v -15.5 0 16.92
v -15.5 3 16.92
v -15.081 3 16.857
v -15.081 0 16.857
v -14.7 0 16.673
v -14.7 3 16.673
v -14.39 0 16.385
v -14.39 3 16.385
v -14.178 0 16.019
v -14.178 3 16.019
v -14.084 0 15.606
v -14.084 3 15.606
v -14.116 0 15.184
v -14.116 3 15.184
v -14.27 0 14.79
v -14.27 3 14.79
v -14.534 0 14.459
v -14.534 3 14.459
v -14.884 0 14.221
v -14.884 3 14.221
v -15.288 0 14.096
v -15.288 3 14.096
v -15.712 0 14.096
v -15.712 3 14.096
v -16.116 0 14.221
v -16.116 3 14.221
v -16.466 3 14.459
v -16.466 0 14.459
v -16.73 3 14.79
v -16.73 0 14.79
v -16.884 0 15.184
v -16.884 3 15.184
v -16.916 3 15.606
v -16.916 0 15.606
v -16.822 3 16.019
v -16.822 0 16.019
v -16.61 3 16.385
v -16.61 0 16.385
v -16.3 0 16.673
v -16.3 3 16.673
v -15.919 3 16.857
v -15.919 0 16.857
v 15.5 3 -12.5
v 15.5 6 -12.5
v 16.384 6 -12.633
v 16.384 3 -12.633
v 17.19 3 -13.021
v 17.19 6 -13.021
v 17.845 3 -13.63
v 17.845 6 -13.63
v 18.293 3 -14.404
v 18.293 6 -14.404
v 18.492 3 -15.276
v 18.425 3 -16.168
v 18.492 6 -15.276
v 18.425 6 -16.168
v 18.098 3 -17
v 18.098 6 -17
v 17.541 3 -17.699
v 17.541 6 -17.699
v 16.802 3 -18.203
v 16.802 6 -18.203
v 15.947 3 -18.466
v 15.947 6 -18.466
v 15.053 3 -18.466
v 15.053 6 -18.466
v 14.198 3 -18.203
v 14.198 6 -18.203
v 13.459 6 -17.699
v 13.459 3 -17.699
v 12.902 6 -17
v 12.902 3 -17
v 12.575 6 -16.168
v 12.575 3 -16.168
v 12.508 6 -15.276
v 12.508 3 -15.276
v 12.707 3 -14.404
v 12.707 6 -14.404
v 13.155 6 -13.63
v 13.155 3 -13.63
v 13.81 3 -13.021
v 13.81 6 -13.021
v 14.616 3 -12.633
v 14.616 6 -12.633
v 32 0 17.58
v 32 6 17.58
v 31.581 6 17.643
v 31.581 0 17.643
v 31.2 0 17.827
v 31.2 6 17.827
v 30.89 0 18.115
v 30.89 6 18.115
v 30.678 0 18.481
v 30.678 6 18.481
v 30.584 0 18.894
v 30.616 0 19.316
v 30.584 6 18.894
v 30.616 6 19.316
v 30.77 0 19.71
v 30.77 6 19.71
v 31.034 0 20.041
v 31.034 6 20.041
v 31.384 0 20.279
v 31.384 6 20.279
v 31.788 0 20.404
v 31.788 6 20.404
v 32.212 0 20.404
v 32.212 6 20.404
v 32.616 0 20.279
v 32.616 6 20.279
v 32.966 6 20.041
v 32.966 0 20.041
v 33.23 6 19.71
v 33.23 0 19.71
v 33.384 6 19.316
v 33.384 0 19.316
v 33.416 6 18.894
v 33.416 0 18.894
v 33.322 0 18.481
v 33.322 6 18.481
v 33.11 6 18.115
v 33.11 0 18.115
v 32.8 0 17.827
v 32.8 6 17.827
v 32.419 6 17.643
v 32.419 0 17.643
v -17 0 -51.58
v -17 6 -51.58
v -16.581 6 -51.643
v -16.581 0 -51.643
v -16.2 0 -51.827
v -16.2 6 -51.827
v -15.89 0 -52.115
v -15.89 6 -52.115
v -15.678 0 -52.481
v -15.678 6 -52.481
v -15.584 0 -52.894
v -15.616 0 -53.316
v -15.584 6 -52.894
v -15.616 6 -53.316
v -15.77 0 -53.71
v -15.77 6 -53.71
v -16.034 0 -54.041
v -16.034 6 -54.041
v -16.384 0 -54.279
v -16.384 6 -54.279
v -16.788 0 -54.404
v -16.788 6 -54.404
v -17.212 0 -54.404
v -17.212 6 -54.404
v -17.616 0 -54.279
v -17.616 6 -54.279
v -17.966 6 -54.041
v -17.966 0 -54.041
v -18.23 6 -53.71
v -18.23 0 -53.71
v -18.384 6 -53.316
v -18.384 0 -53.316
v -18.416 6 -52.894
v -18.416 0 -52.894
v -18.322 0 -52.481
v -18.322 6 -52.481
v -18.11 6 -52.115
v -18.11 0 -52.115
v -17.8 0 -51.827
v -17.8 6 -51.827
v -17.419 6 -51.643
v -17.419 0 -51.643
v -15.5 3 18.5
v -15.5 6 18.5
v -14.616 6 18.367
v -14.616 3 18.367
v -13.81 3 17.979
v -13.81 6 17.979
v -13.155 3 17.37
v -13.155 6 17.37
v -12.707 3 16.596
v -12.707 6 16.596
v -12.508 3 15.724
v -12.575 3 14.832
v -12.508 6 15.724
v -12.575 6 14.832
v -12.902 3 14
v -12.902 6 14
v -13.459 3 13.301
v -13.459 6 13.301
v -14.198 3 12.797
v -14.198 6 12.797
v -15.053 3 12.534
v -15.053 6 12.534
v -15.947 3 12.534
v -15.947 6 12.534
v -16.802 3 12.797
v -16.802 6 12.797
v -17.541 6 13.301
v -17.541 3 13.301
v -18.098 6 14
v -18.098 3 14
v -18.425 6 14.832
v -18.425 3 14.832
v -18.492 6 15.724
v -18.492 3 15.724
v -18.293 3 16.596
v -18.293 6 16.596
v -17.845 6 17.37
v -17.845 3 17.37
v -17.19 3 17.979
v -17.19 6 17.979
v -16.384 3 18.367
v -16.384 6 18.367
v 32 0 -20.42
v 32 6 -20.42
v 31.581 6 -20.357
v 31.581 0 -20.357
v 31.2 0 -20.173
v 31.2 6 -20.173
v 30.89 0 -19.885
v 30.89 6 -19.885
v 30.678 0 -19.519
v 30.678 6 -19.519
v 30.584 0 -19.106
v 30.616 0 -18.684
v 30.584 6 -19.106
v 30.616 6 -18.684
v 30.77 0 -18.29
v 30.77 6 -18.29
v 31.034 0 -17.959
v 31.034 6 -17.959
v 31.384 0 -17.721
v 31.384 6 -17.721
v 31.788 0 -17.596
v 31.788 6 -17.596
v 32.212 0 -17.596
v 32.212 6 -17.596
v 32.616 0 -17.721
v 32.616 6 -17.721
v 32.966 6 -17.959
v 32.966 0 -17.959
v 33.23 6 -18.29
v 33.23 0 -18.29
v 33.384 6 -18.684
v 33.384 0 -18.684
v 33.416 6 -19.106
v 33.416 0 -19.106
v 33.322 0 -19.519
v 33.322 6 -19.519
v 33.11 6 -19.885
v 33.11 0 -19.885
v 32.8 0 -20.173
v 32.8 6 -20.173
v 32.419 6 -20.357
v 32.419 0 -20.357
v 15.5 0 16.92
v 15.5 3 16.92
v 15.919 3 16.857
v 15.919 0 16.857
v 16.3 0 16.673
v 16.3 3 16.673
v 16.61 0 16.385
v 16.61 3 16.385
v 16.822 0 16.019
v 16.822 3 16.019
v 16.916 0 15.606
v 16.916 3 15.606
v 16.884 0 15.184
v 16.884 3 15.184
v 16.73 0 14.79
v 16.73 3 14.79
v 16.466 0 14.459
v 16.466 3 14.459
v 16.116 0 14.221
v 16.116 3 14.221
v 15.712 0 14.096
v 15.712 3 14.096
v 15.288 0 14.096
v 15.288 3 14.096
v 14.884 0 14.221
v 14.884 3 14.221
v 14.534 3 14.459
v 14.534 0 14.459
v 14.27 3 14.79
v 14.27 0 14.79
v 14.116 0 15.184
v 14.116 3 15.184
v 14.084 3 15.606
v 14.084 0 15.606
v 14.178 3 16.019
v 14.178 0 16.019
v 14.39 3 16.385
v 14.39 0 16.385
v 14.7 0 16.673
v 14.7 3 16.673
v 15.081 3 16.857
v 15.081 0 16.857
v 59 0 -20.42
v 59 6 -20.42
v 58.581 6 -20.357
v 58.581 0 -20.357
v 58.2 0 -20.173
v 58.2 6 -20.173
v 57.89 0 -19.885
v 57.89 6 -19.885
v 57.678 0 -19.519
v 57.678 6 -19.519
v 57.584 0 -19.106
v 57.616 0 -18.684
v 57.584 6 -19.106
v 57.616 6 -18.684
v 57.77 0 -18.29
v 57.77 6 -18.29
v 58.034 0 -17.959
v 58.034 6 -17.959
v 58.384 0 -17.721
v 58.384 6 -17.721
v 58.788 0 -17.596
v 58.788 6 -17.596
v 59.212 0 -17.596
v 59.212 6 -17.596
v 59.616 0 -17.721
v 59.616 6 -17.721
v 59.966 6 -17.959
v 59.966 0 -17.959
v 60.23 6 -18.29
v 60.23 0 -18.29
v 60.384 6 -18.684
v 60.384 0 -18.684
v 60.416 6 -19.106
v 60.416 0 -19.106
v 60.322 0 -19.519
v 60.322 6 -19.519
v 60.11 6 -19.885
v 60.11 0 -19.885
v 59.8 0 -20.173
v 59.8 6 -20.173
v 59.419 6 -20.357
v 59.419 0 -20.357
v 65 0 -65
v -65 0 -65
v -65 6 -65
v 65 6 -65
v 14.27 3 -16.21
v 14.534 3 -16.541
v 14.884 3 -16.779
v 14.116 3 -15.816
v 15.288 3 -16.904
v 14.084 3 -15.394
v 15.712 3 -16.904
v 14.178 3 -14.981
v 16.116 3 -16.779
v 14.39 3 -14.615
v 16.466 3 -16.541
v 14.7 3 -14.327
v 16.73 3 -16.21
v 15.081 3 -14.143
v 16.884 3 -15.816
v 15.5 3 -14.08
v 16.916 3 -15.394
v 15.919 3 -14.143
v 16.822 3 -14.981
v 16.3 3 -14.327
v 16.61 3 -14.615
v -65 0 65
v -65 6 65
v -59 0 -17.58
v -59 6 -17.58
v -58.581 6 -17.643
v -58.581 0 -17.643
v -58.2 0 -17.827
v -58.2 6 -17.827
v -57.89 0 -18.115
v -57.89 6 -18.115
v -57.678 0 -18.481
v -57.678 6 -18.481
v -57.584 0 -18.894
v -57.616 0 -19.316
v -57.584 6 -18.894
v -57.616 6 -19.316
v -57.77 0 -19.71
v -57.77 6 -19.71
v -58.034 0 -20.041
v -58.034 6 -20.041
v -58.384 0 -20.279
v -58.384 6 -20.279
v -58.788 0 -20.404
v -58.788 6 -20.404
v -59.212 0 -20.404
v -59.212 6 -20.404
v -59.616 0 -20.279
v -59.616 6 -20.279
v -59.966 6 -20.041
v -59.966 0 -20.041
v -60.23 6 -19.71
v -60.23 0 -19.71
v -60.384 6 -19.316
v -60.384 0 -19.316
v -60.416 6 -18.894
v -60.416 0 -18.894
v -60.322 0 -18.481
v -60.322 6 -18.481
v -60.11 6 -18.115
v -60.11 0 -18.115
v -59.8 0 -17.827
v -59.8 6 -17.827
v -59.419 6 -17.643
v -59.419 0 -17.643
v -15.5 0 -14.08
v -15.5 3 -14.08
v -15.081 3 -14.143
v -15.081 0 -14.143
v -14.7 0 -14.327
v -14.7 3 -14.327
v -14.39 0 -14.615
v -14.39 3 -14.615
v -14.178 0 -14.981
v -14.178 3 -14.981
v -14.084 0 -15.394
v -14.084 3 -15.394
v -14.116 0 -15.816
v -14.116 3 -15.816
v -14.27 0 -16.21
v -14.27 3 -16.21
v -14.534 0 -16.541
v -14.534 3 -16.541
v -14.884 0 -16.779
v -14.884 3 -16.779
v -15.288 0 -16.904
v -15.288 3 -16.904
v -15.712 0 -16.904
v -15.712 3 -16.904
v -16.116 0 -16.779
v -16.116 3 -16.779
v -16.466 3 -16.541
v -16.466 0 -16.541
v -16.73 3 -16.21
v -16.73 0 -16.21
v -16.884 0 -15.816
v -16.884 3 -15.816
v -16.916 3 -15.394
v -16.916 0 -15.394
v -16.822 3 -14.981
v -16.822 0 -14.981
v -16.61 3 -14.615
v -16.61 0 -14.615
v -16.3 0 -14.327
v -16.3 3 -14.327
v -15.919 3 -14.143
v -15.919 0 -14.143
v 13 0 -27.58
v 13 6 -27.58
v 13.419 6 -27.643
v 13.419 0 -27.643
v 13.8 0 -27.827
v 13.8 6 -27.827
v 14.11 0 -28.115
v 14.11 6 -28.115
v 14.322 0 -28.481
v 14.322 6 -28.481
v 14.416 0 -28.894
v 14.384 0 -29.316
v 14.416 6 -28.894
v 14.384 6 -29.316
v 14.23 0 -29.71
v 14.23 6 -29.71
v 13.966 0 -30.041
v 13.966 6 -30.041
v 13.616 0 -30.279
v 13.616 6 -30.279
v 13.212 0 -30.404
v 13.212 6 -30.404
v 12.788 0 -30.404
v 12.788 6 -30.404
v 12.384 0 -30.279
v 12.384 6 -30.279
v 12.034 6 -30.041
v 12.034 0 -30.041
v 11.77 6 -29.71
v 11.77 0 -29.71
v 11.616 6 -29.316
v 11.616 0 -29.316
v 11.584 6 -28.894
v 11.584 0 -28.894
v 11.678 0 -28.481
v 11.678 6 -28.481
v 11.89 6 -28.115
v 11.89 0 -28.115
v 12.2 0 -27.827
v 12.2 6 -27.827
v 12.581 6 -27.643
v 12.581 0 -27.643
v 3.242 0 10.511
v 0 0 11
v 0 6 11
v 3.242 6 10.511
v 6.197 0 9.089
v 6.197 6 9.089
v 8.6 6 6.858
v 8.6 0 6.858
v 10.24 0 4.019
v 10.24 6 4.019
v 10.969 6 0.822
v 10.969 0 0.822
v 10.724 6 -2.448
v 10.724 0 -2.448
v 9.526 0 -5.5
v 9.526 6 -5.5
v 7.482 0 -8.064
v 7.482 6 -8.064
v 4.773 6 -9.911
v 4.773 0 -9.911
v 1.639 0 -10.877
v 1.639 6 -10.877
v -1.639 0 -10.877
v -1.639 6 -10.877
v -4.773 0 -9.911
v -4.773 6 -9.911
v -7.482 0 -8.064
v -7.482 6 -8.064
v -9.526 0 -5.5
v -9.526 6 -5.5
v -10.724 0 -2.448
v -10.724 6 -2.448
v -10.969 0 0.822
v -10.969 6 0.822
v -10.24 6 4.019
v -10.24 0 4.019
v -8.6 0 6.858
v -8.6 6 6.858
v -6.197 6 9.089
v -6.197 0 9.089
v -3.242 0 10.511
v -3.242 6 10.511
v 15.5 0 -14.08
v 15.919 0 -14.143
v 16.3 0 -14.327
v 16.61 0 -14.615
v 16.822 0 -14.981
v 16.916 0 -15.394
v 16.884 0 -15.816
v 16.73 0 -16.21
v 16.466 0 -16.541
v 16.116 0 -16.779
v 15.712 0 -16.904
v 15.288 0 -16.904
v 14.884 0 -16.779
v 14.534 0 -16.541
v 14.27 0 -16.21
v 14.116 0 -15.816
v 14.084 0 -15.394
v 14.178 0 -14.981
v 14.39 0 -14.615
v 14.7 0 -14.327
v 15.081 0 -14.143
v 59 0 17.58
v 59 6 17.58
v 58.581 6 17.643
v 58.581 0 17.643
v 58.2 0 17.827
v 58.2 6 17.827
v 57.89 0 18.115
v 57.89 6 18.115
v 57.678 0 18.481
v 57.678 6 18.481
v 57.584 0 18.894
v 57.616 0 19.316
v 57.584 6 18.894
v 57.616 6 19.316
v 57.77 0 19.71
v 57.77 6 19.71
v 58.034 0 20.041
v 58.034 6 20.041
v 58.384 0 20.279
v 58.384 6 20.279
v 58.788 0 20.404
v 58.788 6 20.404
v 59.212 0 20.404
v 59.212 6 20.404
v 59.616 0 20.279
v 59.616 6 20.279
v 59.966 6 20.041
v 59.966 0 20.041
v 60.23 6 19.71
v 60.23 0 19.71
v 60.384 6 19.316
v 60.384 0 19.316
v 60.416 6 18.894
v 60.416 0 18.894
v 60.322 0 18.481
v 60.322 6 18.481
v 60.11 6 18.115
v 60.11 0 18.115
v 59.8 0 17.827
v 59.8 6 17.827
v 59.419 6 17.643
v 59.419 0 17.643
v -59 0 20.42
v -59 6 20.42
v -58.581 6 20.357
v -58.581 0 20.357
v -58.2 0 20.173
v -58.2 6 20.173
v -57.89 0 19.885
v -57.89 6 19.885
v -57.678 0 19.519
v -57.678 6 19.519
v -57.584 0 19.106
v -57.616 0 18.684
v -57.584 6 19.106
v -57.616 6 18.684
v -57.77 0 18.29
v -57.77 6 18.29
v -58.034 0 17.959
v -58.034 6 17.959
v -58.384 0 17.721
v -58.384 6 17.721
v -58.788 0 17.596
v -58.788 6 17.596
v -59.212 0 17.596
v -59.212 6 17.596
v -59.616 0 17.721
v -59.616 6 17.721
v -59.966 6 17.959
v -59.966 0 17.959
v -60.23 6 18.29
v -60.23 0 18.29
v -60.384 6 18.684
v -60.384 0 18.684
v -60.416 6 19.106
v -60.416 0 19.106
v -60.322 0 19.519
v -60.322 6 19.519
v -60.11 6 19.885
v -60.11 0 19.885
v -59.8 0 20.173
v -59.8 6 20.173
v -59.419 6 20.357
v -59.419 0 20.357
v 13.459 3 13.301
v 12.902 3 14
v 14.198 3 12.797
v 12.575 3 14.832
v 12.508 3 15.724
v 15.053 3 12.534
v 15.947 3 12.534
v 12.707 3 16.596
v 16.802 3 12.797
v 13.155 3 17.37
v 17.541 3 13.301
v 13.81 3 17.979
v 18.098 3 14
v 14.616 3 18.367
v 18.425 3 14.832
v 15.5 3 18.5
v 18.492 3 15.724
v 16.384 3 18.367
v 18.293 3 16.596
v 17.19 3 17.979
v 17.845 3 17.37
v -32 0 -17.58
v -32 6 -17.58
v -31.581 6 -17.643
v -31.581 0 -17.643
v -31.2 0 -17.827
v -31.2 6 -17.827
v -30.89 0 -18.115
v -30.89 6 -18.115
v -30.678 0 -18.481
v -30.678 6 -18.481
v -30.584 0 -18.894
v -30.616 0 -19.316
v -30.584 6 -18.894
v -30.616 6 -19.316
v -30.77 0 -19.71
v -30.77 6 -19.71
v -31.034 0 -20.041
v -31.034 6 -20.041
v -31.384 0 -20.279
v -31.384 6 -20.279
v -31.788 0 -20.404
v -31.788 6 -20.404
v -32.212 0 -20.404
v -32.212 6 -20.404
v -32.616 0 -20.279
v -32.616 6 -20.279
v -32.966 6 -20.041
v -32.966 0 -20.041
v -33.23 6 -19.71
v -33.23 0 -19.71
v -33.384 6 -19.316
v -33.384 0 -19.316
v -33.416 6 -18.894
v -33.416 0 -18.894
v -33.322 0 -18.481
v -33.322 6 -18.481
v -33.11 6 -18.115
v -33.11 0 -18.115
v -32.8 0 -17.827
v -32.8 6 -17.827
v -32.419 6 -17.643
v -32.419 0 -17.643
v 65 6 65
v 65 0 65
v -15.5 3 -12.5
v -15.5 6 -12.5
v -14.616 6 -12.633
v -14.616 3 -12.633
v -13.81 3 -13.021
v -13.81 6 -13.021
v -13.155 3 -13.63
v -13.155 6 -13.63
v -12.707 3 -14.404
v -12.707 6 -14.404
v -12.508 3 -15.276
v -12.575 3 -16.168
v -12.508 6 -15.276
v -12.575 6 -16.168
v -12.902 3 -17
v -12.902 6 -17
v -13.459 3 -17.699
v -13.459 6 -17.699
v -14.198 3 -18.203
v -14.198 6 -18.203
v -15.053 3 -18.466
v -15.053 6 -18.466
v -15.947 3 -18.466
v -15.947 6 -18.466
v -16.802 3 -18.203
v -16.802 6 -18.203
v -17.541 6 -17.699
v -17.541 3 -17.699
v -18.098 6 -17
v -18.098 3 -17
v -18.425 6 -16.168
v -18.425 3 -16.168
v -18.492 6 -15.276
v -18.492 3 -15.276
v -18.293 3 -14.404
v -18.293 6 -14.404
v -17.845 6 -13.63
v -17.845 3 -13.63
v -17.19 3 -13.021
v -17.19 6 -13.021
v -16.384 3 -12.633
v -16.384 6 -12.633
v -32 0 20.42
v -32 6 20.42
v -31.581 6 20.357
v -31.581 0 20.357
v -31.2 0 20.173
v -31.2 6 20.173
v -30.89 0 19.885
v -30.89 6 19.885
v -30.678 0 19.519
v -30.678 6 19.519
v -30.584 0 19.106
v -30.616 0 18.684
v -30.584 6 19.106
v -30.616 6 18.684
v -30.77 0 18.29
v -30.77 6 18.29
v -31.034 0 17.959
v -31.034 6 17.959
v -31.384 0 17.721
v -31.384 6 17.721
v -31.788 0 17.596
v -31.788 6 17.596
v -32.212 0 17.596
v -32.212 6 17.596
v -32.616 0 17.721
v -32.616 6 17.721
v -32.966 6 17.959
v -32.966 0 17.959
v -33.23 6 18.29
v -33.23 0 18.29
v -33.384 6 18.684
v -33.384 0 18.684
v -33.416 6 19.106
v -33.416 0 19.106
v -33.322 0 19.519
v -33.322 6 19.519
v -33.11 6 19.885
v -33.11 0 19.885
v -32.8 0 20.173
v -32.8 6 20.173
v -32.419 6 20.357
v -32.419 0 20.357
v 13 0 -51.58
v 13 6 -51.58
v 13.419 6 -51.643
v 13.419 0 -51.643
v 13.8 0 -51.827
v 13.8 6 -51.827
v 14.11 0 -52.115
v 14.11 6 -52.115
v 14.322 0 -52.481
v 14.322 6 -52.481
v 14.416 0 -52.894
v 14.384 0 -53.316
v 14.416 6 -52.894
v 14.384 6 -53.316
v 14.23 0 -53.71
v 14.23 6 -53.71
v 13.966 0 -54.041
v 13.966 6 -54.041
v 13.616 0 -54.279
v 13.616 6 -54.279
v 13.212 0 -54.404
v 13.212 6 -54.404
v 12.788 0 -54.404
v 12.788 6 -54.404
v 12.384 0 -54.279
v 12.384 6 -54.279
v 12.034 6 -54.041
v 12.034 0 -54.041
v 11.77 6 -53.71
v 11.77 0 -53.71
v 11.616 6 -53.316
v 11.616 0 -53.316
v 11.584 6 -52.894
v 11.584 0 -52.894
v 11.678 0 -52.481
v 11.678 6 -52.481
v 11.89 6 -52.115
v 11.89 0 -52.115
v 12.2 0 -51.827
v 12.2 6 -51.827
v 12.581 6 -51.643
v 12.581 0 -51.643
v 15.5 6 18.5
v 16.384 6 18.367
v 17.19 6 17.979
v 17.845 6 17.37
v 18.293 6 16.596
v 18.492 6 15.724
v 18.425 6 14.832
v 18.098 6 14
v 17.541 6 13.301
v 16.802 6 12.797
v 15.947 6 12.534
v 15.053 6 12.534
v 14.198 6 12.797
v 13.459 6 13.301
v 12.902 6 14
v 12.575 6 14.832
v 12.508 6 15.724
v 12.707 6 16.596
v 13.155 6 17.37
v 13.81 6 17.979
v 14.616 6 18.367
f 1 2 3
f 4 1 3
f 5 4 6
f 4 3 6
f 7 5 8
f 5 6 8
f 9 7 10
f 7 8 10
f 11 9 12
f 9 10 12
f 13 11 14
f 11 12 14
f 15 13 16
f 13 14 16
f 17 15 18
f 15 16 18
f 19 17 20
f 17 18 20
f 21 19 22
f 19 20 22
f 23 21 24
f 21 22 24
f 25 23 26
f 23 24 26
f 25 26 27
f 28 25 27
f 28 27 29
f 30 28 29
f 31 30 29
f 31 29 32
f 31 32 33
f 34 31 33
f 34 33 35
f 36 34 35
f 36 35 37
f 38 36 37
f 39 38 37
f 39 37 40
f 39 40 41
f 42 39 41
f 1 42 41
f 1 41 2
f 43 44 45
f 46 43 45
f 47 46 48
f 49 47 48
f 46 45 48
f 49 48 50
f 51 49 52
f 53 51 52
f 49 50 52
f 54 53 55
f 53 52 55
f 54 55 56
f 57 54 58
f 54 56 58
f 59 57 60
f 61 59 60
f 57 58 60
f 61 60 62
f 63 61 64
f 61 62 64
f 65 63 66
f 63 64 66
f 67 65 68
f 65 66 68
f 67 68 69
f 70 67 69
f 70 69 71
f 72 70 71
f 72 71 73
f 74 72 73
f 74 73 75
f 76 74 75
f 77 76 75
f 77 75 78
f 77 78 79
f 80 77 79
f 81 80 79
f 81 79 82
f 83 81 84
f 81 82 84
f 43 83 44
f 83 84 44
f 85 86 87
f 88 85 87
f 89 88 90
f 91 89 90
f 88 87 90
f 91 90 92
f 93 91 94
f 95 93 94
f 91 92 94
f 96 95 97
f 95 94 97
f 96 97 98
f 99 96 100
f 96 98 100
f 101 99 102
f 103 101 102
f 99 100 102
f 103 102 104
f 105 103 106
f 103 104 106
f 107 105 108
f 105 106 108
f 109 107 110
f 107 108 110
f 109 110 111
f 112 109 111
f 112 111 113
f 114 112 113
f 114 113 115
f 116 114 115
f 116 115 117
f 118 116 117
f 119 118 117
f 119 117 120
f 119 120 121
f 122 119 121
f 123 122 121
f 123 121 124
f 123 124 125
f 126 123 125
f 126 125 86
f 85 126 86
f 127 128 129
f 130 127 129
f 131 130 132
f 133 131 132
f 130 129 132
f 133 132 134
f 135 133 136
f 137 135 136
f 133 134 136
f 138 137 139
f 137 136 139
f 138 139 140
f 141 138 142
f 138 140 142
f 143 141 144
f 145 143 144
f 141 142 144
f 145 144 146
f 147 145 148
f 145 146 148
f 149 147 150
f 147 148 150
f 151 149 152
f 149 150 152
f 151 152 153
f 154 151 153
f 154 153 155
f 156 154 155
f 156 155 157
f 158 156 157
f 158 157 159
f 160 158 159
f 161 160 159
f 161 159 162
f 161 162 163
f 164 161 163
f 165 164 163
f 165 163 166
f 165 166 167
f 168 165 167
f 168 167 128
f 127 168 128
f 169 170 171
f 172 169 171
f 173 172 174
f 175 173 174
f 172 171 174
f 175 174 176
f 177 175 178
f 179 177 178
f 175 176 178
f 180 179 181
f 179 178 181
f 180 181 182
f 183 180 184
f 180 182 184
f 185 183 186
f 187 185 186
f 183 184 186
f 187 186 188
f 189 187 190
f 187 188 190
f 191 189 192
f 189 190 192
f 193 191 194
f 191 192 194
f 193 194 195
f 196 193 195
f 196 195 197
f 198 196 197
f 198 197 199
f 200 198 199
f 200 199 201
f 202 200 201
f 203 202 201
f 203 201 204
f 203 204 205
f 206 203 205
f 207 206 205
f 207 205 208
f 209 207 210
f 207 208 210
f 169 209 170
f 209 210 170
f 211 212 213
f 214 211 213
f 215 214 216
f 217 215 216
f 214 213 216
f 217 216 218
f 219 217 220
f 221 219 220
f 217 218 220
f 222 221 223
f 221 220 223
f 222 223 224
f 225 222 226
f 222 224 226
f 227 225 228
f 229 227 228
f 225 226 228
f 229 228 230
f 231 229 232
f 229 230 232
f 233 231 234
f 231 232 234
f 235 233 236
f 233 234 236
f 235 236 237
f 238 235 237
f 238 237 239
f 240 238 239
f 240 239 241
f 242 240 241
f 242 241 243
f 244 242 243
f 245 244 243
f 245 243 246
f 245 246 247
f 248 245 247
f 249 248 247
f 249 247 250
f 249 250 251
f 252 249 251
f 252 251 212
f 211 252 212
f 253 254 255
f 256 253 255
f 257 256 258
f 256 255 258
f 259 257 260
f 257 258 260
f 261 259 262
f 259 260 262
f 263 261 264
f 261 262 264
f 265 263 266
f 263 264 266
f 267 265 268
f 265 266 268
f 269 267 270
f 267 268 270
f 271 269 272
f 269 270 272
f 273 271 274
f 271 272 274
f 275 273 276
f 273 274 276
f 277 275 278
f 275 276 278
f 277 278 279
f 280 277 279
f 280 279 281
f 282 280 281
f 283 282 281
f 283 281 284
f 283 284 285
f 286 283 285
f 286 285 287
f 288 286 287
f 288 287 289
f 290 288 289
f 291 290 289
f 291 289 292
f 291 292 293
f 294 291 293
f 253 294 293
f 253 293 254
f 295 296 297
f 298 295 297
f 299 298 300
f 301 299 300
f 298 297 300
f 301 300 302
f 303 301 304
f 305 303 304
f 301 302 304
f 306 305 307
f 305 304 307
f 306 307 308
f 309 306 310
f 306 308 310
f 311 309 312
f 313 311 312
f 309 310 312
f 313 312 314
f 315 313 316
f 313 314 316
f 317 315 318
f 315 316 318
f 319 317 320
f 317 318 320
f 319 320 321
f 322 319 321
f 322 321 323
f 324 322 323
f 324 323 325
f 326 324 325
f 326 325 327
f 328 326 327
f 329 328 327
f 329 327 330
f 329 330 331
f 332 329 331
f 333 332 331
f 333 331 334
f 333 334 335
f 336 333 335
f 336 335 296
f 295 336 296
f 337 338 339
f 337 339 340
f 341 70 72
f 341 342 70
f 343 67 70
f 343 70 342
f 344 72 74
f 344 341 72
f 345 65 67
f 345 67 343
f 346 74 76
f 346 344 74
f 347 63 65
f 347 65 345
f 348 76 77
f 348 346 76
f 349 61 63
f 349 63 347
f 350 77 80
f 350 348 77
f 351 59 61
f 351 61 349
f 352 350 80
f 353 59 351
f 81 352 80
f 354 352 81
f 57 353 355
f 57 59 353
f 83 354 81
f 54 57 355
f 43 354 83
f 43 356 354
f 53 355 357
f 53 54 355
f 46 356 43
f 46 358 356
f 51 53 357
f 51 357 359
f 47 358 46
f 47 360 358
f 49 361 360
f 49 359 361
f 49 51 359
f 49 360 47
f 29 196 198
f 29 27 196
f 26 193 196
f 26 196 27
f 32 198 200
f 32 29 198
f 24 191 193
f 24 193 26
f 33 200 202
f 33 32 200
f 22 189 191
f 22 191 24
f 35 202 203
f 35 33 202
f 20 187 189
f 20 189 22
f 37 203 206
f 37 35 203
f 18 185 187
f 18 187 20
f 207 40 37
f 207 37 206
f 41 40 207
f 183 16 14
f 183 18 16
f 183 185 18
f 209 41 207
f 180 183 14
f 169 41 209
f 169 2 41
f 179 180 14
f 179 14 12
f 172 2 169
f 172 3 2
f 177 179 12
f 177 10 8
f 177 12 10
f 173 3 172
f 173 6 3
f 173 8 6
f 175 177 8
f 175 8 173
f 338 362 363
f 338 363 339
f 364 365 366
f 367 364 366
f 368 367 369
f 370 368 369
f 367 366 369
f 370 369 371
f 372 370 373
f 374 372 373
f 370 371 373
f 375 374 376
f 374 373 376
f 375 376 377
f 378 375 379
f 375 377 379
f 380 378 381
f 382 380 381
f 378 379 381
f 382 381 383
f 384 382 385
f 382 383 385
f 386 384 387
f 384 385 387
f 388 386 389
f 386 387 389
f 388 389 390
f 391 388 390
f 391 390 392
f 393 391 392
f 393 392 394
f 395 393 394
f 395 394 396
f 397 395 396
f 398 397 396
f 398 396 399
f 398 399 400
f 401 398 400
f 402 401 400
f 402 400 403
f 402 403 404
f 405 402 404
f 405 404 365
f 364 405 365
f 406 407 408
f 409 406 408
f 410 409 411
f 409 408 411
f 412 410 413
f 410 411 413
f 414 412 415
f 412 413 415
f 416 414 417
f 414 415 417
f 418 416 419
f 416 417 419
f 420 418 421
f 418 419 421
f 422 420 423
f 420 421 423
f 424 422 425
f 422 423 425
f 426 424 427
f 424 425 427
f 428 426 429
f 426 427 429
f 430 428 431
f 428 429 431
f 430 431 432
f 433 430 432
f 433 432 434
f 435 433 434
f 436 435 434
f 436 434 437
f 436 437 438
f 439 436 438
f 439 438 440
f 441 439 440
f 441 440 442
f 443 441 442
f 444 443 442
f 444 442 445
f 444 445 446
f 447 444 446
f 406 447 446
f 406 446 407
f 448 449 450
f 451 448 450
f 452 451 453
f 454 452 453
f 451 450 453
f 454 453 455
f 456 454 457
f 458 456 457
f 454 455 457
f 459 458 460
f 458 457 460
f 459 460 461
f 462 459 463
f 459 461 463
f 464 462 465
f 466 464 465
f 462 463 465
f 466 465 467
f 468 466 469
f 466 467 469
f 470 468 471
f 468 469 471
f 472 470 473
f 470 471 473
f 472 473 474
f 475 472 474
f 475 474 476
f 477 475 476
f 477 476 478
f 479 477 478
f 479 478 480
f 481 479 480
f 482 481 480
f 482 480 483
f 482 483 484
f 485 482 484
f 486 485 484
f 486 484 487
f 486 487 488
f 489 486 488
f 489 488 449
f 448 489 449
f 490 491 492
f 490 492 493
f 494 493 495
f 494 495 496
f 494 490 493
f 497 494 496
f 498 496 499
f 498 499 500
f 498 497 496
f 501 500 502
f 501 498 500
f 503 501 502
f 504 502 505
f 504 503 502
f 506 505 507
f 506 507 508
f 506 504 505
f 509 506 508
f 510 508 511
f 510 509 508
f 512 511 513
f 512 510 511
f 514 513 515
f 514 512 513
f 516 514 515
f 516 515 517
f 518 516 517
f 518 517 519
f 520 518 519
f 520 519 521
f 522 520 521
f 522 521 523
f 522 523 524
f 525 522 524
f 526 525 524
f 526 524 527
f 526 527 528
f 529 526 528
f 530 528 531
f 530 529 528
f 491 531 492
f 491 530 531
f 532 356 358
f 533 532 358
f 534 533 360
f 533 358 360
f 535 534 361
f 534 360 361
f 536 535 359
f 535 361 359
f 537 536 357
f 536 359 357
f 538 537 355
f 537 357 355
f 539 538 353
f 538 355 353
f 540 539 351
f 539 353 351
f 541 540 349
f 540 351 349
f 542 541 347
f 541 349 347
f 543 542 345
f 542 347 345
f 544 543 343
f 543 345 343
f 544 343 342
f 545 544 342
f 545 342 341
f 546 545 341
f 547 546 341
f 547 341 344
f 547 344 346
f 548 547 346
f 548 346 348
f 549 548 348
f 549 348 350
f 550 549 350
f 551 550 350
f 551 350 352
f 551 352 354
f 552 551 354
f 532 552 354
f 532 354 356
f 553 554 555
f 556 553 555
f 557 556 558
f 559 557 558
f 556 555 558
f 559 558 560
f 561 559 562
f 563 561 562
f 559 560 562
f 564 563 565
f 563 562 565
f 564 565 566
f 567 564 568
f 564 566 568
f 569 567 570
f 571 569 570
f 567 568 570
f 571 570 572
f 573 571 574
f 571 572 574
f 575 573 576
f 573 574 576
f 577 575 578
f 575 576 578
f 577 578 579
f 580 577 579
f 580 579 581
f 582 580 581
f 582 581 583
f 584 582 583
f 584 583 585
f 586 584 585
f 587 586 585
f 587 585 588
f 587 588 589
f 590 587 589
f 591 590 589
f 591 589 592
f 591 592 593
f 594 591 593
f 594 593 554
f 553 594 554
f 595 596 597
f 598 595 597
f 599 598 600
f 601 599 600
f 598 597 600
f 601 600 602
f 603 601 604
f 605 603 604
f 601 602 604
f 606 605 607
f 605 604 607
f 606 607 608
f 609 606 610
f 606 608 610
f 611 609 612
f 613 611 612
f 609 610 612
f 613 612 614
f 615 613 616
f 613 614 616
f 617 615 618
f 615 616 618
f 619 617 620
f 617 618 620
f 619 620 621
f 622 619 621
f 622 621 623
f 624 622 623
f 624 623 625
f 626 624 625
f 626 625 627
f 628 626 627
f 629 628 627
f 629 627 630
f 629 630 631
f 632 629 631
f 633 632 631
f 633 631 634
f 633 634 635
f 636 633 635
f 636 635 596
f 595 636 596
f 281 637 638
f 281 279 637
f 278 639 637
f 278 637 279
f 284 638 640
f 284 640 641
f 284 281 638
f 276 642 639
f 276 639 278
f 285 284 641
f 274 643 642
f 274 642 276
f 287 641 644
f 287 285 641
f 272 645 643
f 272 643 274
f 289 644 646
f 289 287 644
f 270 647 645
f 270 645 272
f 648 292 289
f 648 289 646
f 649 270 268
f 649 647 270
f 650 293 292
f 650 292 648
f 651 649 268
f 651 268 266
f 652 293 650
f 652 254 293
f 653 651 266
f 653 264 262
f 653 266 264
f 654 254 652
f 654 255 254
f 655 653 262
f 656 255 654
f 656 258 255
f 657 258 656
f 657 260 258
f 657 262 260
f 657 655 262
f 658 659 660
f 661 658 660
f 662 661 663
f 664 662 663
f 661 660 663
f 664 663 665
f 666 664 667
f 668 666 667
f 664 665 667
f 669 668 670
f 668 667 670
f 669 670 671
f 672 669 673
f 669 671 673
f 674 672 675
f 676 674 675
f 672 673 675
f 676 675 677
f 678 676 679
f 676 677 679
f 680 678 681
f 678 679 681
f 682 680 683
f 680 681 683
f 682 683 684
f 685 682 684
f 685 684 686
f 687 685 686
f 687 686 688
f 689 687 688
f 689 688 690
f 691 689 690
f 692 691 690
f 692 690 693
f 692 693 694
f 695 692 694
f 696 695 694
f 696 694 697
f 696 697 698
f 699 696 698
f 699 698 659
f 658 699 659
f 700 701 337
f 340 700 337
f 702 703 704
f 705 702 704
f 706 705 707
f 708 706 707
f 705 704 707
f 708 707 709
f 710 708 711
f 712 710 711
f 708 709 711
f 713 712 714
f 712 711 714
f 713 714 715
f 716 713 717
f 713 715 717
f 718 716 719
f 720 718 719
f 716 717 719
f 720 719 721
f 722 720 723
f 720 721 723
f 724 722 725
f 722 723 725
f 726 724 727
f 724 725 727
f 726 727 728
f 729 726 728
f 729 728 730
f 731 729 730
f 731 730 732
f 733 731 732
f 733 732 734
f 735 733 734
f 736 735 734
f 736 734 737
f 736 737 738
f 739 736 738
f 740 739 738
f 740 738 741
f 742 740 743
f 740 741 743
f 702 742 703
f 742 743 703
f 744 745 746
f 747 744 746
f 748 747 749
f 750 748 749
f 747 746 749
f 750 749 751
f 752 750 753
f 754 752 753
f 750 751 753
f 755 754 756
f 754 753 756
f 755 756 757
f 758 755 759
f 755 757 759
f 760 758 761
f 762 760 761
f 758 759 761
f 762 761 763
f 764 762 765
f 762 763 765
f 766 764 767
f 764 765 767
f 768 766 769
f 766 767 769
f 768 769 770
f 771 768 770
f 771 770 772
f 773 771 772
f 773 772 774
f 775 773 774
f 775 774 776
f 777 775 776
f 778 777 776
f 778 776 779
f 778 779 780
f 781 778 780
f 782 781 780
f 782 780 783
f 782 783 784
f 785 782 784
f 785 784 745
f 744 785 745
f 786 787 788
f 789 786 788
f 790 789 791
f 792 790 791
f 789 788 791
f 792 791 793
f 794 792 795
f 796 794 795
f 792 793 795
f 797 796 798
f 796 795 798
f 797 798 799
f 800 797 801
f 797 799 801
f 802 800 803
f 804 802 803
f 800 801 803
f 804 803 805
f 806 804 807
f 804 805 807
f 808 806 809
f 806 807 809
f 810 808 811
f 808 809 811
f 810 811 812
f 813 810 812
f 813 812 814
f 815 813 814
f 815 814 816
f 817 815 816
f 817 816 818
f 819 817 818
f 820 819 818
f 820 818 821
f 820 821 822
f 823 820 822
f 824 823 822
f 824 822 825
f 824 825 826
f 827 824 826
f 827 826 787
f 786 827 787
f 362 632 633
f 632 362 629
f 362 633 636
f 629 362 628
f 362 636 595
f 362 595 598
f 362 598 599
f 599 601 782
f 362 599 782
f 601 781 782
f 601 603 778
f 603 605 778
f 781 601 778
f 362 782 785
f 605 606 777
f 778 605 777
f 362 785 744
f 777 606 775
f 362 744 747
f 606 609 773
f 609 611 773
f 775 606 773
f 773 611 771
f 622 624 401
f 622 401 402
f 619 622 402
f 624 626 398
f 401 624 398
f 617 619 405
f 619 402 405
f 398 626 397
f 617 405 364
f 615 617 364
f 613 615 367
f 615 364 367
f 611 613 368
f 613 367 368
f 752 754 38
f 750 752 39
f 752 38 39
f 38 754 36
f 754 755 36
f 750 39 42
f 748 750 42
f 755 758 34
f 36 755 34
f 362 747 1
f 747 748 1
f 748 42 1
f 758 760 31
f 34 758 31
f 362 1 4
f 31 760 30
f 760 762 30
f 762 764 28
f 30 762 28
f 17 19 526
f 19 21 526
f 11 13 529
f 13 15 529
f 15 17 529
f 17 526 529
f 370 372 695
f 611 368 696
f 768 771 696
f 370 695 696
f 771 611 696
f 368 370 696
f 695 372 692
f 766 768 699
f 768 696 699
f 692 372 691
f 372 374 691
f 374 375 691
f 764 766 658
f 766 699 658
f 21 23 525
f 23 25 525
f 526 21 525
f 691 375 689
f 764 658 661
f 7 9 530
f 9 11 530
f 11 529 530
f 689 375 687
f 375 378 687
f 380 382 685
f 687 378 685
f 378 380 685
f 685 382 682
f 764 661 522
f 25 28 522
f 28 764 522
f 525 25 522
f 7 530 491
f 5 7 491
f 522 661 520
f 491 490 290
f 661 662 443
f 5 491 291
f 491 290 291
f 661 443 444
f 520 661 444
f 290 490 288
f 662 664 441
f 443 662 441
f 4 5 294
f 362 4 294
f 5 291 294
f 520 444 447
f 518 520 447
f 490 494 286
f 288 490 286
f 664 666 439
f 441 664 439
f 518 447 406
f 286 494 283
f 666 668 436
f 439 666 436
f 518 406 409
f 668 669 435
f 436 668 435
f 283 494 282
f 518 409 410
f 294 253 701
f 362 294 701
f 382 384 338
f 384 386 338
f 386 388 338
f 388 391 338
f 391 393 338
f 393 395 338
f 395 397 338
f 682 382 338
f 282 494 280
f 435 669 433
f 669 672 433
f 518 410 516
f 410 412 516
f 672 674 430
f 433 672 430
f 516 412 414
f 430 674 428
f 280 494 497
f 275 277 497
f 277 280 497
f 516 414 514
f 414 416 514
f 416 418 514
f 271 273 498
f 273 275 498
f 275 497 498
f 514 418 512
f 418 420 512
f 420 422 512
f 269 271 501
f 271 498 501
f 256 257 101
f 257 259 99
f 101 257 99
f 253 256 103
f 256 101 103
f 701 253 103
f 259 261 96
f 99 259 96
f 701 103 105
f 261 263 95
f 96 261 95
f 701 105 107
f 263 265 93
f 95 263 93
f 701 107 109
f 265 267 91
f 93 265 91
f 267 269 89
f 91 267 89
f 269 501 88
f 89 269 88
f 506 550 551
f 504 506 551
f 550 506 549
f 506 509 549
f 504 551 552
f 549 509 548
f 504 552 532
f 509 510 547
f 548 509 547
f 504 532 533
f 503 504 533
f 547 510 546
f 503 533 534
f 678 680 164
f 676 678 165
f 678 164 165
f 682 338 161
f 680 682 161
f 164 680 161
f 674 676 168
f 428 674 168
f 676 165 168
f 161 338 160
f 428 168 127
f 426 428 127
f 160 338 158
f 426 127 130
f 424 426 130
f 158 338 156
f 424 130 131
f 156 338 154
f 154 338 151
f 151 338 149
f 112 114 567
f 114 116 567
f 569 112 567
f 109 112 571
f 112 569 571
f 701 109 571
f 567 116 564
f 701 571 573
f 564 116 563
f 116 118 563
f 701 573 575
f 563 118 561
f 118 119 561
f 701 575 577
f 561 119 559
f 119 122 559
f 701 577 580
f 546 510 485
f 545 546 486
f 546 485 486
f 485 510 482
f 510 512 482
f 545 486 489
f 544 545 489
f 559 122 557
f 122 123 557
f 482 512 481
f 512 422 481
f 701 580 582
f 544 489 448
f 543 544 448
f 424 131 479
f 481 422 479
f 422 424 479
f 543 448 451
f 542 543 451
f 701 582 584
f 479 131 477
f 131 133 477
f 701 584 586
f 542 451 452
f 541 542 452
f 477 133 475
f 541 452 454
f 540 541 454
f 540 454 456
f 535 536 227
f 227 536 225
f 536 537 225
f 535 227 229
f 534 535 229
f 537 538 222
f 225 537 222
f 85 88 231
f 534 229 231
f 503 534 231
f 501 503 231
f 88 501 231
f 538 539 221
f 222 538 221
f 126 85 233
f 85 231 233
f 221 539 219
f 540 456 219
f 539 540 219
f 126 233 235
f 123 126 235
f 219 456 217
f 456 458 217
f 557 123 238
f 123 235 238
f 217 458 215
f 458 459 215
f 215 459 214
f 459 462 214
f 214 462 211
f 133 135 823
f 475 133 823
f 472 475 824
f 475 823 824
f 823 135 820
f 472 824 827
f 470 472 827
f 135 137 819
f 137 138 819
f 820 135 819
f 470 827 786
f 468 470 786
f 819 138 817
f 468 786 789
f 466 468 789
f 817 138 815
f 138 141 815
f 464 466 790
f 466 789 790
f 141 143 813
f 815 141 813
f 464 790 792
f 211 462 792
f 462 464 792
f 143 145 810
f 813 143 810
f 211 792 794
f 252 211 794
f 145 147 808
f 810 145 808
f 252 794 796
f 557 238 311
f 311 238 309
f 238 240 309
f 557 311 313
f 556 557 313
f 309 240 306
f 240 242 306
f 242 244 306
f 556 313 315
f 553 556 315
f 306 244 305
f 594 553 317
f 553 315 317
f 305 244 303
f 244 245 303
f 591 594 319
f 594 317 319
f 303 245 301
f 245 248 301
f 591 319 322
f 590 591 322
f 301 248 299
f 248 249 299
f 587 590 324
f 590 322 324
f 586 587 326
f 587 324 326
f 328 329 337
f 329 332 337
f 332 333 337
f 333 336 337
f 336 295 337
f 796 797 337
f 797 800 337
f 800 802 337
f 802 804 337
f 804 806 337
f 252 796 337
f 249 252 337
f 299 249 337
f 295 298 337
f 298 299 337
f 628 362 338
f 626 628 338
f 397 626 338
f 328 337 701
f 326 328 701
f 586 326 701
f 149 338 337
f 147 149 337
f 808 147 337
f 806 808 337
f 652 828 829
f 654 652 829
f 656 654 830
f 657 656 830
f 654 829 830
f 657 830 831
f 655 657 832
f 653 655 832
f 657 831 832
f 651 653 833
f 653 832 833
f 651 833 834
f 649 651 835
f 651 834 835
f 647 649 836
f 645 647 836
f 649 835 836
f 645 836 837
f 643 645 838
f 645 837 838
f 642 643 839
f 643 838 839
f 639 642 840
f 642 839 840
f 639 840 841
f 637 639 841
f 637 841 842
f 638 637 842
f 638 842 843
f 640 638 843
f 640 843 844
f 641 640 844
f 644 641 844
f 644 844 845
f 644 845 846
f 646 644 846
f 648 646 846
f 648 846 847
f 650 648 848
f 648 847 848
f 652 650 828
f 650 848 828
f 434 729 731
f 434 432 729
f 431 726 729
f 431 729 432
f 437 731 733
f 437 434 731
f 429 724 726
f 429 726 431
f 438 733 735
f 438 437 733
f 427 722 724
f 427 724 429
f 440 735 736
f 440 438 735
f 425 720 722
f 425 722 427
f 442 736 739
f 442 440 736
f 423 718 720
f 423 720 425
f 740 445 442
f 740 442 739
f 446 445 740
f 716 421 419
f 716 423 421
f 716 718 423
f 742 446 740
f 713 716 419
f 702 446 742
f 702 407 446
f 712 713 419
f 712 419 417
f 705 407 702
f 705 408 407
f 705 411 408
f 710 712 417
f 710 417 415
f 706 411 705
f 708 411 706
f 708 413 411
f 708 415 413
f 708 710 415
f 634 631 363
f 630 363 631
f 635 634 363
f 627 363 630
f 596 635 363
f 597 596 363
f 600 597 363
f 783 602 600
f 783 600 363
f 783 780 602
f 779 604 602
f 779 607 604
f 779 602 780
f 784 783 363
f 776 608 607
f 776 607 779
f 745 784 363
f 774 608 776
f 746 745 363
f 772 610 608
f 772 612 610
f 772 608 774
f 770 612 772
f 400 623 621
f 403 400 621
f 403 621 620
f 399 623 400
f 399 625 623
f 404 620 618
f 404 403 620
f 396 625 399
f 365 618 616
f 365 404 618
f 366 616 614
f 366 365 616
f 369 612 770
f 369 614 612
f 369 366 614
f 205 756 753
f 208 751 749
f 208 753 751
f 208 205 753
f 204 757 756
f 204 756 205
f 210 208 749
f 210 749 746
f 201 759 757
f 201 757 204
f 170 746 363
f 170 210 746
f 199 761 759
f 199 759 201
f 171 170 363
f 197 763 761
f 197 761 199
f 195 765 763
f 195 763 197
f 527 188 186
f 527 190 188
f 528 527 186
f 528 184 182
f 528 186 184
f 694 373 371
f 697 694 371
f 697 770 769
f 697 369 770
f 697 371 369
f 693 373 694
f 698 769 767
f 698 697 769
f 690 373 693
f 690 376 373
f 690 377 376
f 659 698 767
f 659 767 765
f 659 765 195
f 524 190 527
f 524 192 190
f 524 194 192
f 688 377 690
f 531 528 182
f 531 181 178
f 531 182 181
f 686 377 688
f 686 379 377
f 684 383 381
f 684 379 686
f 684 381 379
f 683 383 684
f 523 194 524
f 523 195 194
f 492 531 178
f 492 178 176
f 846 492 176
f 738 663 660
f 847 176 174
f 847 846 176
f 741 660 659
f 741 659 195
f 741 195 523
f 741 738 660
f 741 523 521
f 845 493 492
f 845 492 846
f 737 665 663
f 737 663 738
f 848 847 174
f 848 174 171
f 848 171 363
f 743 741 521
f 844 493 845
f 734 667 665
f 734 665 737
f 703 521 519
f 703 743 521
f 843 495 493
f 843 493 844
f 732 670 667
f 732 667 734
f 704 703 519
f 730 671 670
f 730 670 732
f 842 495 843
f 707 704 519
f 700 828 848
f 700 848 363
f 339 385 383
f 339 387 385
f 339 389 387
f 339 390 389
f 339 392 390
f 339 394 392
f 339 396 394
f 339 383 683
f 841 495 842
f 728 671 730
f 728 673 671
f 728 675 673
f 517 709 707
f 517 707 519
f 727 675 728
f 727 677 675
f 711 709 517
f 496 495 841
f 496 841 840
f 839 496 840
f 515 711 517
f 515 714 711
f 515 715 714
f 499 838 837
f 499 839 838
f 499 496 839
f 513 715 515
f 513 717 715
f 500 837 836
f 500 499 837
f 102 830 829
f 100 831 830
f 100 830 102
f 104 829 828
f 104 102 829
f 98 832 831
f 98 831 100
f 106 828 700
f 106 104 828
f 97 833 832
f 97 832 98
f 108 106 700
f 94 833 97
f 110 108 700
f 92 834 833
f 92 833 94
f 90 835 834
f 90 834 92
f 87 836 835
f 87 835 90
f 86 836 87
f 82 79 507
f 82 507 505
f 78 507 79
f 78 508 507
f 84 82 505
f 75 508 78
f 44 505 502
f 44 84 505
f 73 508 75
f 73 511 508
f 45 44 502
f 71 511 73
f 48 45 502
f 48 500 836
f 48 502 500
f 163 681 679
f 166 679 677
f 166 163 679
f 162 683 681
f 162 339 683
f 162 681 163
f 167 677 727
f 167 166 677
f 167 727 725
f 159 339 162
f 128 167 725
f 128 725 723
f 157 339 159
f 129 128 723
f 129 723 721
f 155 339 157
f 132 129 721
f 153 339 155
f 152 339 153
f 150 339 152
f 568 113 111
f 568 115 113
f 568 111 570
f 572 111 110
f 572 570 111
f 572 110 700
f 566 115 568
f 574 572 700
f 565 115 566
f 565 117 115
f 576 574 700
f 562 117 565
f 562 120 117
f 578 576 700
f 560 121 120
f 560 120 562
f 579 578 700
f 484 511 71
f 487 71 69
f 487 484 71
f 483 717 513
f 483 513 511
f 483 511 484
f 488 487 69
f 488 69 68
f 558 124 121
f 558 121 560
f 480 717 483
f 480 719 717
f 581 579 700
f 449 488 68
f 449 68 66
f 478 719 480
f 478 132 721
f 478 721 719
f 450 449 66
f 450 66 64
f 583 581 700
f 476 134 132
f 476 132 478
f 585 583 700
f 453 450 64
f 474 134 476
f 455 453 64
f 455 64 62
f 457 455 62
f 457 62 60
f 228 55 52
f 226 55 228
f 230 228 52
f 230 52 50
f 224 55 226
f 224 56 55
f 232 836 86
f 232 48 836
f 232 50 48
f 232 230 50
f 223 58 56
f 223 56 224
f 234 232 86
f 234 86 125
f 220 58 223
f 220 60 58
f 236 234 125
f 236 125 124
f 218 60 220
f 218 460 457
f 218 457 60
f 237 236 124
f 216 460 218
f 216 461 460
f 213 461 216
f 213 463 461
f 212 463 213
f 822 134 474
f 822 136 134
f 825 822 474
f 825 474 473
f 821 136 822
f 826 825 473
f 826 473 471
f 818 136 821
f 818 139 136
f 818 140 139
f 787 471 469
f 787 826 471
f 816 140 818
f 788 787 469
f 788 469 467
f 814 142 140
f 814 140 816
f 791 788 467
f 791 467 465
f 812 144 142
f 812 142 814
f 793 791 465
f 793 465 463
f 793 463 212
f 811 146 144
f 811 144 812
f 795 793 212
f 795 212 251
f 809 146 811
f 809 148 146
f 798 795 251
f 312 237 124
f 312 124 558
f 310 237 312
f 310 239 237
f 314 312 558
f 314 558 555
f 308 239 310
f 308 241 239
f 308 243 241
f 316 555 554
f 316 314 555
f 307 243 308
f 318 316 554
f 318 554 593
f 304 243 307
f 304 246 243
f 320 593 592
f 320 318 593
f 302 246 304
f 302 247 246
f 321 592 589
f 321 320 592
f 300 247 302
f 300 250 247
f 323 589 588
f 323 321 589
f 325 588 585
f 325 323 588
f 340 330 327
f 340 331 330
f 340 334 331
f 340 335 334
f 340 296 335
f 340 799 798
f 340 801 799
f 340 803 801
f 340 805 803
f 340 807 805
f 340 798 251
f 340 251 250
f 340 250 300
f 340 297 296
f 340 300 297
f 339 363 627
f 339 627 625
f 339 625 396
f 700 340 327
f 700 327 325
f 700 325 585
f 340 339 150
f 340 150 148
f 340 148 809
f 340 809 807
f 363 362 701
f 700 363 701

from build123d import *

# Parameters (mm, degrees)
SKETCH1_W           = 130
SKETCH1_H           = 130
SKETCH1_R           = 11
BOSS_EXTRUDE1_DEPTH = 6
SKETCH2_R           = 1.42
CUT_EXTRUDE1_DEPTH  = 6
SKETCH3_R           = 3
CUT_EXTRUDE2_DEPTH  = 3
SKETCH4_R           = 1.42
CUT_EXTRUDE3_DEPTH  = 10
SKETCH5_R           = 1.42
CUT_EXTRUDE4_DEPTH  = 10


with BuildPart() as part:
    # Sketch1 → Boss-Extrude1 (new body)
    with BuildSketch(Plane(origin=(0, 0, 0), x_dir=(1, 0, 0), z_dir=(0, 1, 0))):
        Rectangle(SKETCH1_W, SKETCH1_H)
        with Locations(Location((0, 0, 0), (0, 0, 270))):
            Circle(SKETCH1_R, mode=Mode.SUBTRACT)
    extrude(amount=BOSS_EXTRUDE1_DEPTH)

    # Sketch2 → Cut-Extrude1 (cut)
    with BuildSketch(Plane(origin=(0, 6, 0), x_dir=(1, 0, 0), z_dir=(0, 1, 0))):
        with Locations(Location((-15.5, 15.5, 0), (0, 0, 270))):
            Circle(SKETCH2_R)
        with Locations(Location((15.5, 15.5, 0), (0, 0, 270))):
            Circle(SKETCH2_R)
        with Locations(Location((15.5, -15.5, 0), (0, 0, 270))):
            Circle(SKETCH2_R)
        with Locations(Location((-15.5, -15.5, 0), (0, 0, 270))):
            Circle(SKETCH2_R)
    extrude(amount=-CUT_EXTRUDE1_DEPTH, mode=Mode.SUBTRACT)

    # Sketch3 → Cut-Extrude2 (cut)
    with BuildSketch(Plane(origin=(0, 6, 0), x_dir=(1, 0, 0), z_dir=(0, 1, 0))):
        with Locations(Location((-15.5, 15.5, 0), (0, 0, 270))):
            Circle(SKETCH3_R)
        with Locations(Location((15.5, 15.5, 0), (0, 0, 270))):
            Circle(SKETCH3_R)
        with Locations(Location((15.5, -15.5, 0), (0, 0, 270))):
            Circle(SKETCH3_R)
        with Locations(Location((-15.5, -15.5, 0), (0, 0, 270))):
            Circle(SKETCH3_R)
    extrude(amount=-CUT_EXTRUDE2_DEPTH, mode=Mode.SUBTRACT)

    # Sketch4 → Cut-Extrude3 (cut)
    with BuildSketch(Plane(origin=(0, 6, 0), x_dir=(1, 0, 0), z_dir=(0, 1, 0))):
        with Locations(Location((-59, 19, 0), (0, 0, 270))):
            Circle(SKETCH4_R)
        with Locations(Location((-32, 19, 0), (0, 0, 270))):
            Circle(SKETCH4_R)
        with Locations(Location((-32, -19, 0), (0, 0, 270))):
            Circle(SKETCH4_R)
        with Locations(Location((-59, -19, 0), (0, 0, 270))):
            Circle(SKETCH4_R)
        with Locations(Location((59, 19, 0), (0, 0, 90))):
            Circle(SKETCH4_R)
        with Locations(Location((59, -19, 0), (0, 0, 90))):
            Circle(SKETCH4_R)
        with Locations(Location((32, -19, 0), (0, 0, 90))):
            Circle(SKETCH4_R)
        with Locations(Location((32, 19, 0), (0, 0, 90))):
            Circle(SKETCH4_R)
    extrude(amount=-CUT_EXTRUDE3_DEPTH, mode=Mode.SUBTRACT)

    # Sketch5 → Cut-Extrude4 (cut)
    with BuildSketch(Plane(origin=(0, 6, 0), x_dir=(1, 0, 0), z_dir=(0, 1, 0))):
        with Locations(Location((13, 53, 0), (0, 0, 270))):
            Circle(SKETCH5_R)
        with Locations(Location((-17, 53, 0), (0, 0, 270))):
            Circle(SKETCH5_R)
        with Locations(Location((13, 29, 0), (0, 0, 270))):
            Circle(SKETCH5_R)
    extrude(amount=-CUT_EXTRUDE4_DEPTH, mode=Mode.SUBTRACT)


solid = part.part
